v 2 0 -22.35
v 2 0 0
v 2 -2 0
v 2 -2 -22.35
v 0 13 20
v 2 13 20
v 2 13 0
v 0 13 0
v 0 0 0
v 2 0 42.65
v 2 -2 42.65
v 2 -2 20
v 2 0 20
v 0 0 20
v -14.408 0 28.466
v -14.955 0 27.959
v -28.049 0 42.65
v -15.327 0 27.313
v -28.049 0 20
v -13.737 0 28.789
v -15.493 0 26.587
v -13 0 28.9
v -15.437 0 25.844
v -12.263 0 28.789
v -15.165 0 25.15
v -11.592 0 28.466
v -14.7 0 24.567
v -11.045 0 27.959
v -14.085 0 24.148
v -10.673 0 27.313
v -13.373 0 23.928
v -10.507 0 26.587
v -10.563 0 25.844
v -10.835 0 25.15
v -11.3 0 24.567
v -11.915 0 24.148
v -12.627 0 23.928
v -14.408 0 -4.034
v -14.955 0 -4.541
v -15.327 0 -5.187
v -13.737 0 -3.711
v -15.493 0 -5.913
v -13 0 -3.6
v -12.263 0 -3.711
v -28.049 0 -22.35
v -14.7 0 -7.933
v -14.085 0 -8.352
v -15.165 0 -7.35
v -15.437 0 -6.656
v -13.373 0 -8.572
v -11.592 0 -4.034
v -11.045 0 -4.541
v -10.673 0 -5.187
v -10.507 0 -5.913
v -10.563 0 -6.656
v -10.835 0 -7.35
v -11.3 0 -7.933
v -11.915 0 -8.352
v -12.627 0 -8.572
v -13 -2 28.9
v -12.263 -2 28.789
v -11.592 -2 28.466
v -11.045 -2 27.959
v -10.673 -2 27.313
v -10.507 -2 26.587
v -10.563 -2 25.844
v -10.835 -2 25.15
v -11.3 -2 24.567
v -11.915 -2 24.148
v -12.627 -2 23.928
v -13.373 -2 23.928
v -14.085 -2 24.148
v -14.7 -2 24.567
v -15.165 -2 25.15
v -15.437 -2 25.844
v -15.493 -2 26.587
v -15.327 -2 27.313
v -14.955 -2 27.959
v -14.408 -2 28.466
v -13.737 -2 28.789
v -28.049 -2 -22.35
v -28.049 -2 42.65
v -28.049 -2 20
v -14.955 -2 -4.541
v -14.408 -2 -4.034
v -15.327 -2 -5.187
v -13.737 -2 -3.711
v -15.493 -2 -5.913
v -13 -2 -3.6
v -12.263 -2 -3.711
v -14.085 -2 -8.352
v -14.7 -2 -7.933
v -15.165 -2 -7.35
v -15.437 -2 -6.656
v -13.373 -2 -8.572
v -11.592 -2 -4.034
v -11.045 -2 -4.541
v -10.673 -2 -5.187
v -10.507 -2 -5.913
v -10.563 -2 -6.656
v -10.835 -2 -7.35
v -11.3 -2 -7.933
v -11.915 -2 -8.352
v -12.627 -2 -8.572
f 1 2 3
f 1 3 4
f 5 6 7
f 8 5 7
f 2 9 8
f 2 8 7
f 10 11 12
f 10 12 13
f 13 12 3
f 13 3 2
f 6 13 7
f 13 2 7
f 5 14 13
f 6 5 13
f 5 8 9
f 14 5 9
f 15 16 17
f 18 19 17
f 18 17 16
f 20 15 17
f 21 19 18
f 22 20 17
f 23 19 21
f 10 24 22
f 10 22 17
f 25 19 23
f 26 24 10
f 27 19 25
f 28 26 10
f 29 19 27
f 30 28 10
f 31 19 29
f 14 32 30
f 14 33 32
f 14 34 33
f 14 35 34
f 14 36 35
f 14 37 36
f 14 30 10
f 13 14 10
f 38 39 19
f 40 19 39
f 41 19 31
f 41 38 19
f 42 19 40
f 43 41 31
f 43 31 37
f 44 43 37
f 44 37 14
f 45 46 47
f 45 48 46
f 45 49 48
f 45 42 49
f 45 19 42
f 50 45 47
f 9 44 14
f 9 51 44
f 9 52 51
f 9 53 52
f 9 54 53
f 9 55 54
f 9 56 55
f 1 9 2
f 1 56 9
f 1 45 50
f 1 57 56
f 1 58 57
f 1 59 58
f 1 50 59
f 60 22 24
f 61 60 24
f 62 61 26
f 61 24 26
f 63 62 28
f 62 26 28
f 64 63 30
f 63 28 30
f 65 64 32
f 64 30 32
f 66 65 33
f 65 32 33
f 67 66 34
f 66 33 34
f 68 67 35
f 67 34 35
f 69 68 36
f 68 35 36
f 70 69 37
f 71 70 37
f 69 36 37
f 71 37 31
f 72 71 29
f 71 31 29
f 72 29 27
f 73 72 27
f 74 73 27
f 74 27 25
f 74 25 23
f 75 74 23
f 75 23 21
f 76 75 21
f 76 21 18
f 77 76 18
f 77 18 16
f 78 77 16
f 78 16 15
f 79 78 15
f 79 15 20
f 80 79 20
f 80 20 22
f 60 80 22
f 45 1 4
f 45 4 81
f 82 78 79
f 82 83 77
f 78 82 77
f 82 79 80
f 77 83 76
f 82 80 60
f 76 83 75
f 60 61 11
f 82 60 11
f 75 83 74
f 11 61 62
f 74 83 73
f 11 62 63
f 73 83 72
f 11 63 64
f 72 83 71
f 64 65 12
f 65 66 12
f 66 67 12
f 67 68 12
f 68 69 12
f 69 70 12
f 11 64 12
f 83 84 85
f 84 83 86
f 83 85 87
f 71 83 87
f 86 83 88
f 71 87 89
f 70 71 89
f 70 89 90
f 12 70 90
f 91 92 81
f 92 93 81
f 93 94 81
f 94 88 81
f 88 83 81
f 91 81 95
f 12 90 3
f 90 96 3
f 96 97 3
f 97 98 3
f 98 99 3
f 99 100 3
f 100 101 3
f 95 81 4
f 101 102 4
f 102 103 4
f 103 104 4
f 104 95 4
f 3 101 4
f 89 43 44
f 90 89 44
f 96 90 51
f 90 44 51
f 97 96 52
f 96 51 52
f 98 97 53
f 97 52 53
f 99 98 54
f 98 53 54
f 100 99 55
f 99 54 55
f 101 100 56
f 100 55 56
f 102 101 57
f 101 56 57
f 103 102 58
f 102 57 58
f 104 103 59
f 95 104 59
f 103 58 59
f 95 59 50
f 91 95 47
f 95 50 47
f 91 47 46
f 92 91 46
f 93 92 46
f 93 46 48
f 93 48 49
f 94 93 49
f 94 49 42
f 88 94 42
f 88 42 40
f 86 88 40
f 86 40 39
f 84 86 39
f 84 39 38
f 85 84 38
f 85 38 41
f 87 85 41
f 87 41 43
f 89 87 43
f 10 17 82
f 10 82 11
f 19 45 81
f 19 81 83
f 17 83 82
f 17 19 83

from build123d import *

# Parameters (mm, degrees)
EXTRUDE_1_DEPTH     = 20
SKETCH_4_W          = 20
SKETCH_4_H          = 16.999999963
CUT_EXTRUDE_1_DEPTH = 47.935226042
SKETCH_6_W          = 30.048551437
SKETCH_6_H          = 22.650000031
EXTRUDE_1_2_DEPTH   = 2
SKETCH_7_R          = 2.5
CUT_EXTRUDE_2_DEPTH = 53.675836409


with BuildPart() as part:
    # Эскиз1 → Extrude 1 (new body)
    with BuildSketch(Plane.XY):
        Polygon((0, 30), (0, 0), (-28.048551439, 0), (-28.048551439, -2), (2, -2), (2, 30), align=None)
    extrude(amount=EXTRUDE_1_DEPTH)

    # Эскиз4 → Вырез-Вытянуть1 (cut, through all)
    with BuildSketch(Plane(origin=(2, 0, 0), x_dir=(0, 0, -1), z_dir=(1, 0, 0))):
        with Locations((-10, 21.500000019)):
            Rectangle(SKETCH_4_W, SKETCH_4_H)
    extrude(amount=-CUT_EXTRUDE_1_DEPTH, mode=Mode.SUBTRACT)

    # Эскиз6 → Extrude 1 2 (add)
    with BuildSketch(Plane(origin=(0, 0, 0), x_dir=(1, 0, 0), z_dir=(0, 1, 0))):
        Polygon((-28.048551439, 0), (1.999999998, 0), (2.000000002, 22.349999969), (-28.048551439, 22.349999969), align=None)
        with Locations((-13.024275721, -31.325000016)):
            Rectangle(SKETCH_6_W, SKETCH_6_H)
    extrude(amount=-EXTRUDE_1_2_DEPTH)

    # Эскиз7 → Вырез-Вытянуть2 (cut, through all)
    with BuildSketch(Plane(origin=(0, 0, 0), x_dir=(1, 0, 0), z_dir=(0, 1, 0))):
        with Locations(Location((-12.999999999, 6.09999997, 0), (0, 0, 270))):
            Circle(SKETCH_7_R)
        with Locations(Location((-13.000000001, -26.40000003, 0), (0, 0, 270))):
            Circle(SKETCH_7_R)
    extrude(amount=-CUT_EXTRUDE_2_DEPTH, mode=Mode.SUBTRACT)


solid = part.part
